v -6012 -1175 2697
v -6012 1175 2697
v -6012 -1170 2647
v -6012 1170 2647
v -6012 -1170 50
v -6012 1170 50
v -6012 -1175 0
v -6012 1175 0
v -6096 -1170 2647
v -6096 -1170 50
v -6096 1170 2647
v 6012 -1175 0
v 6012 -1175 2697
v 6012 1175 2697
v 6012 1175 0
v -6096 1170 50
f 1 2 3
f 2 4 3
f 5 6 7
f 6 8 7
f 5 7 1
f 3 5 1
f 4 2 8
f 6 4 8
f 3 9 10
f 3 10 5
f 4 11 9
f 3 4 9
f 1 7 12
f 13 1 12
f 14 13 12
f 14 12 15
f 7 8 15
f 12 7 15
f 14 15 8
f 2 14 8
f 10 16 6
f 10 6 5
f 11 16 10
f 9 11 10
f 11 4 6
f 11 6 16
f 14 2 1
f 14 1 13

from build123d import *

# Parameters (mm, degrees)
F1_DEPTH = 2697
F2_W     = 2340
F2_H     = 50
F3_DEPTH = 84


with BuildPart() as f1:
    # F0 (on Top) → F1 (new body)
    with BuildSketch(Plane.XY):
        Polygon((-6012, -1175), (6012, -1175), (6012, 1175), (-6012, 1175), (-6012, 1170), (-6096, 1170), (-6096, -1170), (-6012, -1170), align=None)
    extrude(amount=F1_DEPTH)

    # F2 (on face) → F3 (cut, through all)
    with BuildSketch(Plane(origin=(-6096, 0, 0), x_dir=(0, -1, 0), z_dir=(-1, 0, 0))):
        with Locations((0, 2672)):
            Rectangle(F2_W, F2_H)
        with Locations((0, 25)):
            Rectangle(F2_W, F2_H)
    extrude(amount=-F3_DEPTH, mode=Mode.SUBTRACT)


solid = f1.part
